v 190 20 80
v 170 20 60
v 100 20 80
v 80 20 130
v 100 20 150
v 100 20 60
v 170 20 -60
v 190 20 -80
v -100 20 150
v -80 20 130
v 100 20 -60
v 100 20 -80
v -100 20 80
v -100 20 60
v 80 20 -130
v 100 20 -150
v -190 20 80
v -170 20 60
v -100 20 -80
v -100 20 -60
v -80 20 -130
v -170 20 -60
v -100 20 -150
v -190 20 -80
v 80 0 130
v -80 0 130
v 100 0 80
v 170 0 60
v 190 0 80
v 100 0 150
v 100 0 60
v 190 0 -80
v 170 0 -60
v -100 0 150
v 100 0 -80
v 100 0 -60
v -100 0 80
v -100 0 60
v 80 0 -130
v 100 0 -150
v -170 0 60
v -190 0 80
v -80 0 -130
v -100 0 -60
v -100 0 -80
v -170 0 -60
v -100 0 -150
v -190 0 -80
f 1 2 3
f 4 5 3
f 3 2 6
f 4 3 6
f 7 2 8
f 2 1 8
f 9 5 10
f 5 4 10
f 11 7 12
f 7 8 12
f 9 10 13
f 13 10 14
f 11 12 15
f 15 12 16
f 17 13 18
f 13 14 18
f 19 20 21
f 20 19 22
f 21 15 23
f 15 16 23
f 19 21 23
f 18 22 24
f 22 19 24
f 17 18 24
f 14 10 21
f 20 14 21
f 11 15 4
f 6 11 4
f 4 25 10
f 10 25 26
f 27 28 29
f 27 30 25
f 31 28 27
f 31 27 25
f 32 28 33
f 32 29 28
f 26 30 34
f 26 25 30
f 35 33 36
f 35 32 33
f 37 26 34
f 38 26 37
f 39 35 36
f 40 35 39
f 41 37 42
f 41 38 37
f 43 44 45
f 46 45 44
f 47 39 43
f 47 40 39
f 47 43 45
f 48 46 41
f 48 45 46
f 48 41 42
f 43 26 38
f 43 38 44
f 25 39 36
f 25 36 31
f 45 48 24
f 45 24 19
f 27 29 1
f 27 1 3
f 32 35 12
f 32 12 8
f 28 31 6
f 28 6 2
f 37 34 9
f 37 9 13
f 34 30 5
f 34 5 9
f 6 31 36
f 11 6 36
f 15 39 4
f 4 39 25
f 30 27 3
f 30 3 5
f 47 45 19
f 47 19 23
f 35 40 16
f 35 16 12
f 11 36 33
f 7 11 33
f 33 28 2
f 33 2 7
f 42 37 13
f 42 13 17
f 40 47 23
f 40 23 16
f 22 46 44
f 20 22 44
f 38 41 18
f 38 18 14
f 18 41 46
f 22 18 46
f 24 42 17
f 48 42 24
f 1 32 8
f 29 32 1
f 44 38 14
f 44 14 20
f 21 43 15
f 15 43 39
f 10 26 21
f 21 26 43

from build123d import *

# Parameters (mm, degrees)
SKETCH4_W           = 70
SKETCH4_H           = 120
BOSS_EXTRUDE2_DEPTH = 20


with BuildPart() as part:
    # Sketch4 → Boss-Extrude2 (new body)
    with BuildSketch(Plane(origin=(0, 0, 0), x_dir=(1, 0, 0), z_dir=(0, 1, 0))):
        Polygon((-100, 150), (100, 150), (100, 80), (190, 80), (190, -80), (100, -80), (100, -150), (-100, -150), (-100, -80), (-190, -80), (-190, 80), (-100, 80), align=None)
        with Locations((135, 0)):
            Rectangle(SKETCH4_W, SKETCH4_H, mode=Mode.SUBTRACT)
        Polygon((-80, 130), (-10, 130), (10, 130), (80, 130), (80, 60), (80, 40), (80, -40), (80, -60), (80, -130), (10, -130), (-10, -130), (-80, -130), (-80, -60), (-80, -40), (-80, 40), (-80, 60), align=None, mode=Mode.SUBTRACT)
        with Locations((-135, 0)):
            Rectangle(SKETCH4_W, SKETCH4_H, mode=Mode.SUBTRACT)
    extrude(amount=BOSS_EXTRUDE2_DEPTH)


solid = part.part
